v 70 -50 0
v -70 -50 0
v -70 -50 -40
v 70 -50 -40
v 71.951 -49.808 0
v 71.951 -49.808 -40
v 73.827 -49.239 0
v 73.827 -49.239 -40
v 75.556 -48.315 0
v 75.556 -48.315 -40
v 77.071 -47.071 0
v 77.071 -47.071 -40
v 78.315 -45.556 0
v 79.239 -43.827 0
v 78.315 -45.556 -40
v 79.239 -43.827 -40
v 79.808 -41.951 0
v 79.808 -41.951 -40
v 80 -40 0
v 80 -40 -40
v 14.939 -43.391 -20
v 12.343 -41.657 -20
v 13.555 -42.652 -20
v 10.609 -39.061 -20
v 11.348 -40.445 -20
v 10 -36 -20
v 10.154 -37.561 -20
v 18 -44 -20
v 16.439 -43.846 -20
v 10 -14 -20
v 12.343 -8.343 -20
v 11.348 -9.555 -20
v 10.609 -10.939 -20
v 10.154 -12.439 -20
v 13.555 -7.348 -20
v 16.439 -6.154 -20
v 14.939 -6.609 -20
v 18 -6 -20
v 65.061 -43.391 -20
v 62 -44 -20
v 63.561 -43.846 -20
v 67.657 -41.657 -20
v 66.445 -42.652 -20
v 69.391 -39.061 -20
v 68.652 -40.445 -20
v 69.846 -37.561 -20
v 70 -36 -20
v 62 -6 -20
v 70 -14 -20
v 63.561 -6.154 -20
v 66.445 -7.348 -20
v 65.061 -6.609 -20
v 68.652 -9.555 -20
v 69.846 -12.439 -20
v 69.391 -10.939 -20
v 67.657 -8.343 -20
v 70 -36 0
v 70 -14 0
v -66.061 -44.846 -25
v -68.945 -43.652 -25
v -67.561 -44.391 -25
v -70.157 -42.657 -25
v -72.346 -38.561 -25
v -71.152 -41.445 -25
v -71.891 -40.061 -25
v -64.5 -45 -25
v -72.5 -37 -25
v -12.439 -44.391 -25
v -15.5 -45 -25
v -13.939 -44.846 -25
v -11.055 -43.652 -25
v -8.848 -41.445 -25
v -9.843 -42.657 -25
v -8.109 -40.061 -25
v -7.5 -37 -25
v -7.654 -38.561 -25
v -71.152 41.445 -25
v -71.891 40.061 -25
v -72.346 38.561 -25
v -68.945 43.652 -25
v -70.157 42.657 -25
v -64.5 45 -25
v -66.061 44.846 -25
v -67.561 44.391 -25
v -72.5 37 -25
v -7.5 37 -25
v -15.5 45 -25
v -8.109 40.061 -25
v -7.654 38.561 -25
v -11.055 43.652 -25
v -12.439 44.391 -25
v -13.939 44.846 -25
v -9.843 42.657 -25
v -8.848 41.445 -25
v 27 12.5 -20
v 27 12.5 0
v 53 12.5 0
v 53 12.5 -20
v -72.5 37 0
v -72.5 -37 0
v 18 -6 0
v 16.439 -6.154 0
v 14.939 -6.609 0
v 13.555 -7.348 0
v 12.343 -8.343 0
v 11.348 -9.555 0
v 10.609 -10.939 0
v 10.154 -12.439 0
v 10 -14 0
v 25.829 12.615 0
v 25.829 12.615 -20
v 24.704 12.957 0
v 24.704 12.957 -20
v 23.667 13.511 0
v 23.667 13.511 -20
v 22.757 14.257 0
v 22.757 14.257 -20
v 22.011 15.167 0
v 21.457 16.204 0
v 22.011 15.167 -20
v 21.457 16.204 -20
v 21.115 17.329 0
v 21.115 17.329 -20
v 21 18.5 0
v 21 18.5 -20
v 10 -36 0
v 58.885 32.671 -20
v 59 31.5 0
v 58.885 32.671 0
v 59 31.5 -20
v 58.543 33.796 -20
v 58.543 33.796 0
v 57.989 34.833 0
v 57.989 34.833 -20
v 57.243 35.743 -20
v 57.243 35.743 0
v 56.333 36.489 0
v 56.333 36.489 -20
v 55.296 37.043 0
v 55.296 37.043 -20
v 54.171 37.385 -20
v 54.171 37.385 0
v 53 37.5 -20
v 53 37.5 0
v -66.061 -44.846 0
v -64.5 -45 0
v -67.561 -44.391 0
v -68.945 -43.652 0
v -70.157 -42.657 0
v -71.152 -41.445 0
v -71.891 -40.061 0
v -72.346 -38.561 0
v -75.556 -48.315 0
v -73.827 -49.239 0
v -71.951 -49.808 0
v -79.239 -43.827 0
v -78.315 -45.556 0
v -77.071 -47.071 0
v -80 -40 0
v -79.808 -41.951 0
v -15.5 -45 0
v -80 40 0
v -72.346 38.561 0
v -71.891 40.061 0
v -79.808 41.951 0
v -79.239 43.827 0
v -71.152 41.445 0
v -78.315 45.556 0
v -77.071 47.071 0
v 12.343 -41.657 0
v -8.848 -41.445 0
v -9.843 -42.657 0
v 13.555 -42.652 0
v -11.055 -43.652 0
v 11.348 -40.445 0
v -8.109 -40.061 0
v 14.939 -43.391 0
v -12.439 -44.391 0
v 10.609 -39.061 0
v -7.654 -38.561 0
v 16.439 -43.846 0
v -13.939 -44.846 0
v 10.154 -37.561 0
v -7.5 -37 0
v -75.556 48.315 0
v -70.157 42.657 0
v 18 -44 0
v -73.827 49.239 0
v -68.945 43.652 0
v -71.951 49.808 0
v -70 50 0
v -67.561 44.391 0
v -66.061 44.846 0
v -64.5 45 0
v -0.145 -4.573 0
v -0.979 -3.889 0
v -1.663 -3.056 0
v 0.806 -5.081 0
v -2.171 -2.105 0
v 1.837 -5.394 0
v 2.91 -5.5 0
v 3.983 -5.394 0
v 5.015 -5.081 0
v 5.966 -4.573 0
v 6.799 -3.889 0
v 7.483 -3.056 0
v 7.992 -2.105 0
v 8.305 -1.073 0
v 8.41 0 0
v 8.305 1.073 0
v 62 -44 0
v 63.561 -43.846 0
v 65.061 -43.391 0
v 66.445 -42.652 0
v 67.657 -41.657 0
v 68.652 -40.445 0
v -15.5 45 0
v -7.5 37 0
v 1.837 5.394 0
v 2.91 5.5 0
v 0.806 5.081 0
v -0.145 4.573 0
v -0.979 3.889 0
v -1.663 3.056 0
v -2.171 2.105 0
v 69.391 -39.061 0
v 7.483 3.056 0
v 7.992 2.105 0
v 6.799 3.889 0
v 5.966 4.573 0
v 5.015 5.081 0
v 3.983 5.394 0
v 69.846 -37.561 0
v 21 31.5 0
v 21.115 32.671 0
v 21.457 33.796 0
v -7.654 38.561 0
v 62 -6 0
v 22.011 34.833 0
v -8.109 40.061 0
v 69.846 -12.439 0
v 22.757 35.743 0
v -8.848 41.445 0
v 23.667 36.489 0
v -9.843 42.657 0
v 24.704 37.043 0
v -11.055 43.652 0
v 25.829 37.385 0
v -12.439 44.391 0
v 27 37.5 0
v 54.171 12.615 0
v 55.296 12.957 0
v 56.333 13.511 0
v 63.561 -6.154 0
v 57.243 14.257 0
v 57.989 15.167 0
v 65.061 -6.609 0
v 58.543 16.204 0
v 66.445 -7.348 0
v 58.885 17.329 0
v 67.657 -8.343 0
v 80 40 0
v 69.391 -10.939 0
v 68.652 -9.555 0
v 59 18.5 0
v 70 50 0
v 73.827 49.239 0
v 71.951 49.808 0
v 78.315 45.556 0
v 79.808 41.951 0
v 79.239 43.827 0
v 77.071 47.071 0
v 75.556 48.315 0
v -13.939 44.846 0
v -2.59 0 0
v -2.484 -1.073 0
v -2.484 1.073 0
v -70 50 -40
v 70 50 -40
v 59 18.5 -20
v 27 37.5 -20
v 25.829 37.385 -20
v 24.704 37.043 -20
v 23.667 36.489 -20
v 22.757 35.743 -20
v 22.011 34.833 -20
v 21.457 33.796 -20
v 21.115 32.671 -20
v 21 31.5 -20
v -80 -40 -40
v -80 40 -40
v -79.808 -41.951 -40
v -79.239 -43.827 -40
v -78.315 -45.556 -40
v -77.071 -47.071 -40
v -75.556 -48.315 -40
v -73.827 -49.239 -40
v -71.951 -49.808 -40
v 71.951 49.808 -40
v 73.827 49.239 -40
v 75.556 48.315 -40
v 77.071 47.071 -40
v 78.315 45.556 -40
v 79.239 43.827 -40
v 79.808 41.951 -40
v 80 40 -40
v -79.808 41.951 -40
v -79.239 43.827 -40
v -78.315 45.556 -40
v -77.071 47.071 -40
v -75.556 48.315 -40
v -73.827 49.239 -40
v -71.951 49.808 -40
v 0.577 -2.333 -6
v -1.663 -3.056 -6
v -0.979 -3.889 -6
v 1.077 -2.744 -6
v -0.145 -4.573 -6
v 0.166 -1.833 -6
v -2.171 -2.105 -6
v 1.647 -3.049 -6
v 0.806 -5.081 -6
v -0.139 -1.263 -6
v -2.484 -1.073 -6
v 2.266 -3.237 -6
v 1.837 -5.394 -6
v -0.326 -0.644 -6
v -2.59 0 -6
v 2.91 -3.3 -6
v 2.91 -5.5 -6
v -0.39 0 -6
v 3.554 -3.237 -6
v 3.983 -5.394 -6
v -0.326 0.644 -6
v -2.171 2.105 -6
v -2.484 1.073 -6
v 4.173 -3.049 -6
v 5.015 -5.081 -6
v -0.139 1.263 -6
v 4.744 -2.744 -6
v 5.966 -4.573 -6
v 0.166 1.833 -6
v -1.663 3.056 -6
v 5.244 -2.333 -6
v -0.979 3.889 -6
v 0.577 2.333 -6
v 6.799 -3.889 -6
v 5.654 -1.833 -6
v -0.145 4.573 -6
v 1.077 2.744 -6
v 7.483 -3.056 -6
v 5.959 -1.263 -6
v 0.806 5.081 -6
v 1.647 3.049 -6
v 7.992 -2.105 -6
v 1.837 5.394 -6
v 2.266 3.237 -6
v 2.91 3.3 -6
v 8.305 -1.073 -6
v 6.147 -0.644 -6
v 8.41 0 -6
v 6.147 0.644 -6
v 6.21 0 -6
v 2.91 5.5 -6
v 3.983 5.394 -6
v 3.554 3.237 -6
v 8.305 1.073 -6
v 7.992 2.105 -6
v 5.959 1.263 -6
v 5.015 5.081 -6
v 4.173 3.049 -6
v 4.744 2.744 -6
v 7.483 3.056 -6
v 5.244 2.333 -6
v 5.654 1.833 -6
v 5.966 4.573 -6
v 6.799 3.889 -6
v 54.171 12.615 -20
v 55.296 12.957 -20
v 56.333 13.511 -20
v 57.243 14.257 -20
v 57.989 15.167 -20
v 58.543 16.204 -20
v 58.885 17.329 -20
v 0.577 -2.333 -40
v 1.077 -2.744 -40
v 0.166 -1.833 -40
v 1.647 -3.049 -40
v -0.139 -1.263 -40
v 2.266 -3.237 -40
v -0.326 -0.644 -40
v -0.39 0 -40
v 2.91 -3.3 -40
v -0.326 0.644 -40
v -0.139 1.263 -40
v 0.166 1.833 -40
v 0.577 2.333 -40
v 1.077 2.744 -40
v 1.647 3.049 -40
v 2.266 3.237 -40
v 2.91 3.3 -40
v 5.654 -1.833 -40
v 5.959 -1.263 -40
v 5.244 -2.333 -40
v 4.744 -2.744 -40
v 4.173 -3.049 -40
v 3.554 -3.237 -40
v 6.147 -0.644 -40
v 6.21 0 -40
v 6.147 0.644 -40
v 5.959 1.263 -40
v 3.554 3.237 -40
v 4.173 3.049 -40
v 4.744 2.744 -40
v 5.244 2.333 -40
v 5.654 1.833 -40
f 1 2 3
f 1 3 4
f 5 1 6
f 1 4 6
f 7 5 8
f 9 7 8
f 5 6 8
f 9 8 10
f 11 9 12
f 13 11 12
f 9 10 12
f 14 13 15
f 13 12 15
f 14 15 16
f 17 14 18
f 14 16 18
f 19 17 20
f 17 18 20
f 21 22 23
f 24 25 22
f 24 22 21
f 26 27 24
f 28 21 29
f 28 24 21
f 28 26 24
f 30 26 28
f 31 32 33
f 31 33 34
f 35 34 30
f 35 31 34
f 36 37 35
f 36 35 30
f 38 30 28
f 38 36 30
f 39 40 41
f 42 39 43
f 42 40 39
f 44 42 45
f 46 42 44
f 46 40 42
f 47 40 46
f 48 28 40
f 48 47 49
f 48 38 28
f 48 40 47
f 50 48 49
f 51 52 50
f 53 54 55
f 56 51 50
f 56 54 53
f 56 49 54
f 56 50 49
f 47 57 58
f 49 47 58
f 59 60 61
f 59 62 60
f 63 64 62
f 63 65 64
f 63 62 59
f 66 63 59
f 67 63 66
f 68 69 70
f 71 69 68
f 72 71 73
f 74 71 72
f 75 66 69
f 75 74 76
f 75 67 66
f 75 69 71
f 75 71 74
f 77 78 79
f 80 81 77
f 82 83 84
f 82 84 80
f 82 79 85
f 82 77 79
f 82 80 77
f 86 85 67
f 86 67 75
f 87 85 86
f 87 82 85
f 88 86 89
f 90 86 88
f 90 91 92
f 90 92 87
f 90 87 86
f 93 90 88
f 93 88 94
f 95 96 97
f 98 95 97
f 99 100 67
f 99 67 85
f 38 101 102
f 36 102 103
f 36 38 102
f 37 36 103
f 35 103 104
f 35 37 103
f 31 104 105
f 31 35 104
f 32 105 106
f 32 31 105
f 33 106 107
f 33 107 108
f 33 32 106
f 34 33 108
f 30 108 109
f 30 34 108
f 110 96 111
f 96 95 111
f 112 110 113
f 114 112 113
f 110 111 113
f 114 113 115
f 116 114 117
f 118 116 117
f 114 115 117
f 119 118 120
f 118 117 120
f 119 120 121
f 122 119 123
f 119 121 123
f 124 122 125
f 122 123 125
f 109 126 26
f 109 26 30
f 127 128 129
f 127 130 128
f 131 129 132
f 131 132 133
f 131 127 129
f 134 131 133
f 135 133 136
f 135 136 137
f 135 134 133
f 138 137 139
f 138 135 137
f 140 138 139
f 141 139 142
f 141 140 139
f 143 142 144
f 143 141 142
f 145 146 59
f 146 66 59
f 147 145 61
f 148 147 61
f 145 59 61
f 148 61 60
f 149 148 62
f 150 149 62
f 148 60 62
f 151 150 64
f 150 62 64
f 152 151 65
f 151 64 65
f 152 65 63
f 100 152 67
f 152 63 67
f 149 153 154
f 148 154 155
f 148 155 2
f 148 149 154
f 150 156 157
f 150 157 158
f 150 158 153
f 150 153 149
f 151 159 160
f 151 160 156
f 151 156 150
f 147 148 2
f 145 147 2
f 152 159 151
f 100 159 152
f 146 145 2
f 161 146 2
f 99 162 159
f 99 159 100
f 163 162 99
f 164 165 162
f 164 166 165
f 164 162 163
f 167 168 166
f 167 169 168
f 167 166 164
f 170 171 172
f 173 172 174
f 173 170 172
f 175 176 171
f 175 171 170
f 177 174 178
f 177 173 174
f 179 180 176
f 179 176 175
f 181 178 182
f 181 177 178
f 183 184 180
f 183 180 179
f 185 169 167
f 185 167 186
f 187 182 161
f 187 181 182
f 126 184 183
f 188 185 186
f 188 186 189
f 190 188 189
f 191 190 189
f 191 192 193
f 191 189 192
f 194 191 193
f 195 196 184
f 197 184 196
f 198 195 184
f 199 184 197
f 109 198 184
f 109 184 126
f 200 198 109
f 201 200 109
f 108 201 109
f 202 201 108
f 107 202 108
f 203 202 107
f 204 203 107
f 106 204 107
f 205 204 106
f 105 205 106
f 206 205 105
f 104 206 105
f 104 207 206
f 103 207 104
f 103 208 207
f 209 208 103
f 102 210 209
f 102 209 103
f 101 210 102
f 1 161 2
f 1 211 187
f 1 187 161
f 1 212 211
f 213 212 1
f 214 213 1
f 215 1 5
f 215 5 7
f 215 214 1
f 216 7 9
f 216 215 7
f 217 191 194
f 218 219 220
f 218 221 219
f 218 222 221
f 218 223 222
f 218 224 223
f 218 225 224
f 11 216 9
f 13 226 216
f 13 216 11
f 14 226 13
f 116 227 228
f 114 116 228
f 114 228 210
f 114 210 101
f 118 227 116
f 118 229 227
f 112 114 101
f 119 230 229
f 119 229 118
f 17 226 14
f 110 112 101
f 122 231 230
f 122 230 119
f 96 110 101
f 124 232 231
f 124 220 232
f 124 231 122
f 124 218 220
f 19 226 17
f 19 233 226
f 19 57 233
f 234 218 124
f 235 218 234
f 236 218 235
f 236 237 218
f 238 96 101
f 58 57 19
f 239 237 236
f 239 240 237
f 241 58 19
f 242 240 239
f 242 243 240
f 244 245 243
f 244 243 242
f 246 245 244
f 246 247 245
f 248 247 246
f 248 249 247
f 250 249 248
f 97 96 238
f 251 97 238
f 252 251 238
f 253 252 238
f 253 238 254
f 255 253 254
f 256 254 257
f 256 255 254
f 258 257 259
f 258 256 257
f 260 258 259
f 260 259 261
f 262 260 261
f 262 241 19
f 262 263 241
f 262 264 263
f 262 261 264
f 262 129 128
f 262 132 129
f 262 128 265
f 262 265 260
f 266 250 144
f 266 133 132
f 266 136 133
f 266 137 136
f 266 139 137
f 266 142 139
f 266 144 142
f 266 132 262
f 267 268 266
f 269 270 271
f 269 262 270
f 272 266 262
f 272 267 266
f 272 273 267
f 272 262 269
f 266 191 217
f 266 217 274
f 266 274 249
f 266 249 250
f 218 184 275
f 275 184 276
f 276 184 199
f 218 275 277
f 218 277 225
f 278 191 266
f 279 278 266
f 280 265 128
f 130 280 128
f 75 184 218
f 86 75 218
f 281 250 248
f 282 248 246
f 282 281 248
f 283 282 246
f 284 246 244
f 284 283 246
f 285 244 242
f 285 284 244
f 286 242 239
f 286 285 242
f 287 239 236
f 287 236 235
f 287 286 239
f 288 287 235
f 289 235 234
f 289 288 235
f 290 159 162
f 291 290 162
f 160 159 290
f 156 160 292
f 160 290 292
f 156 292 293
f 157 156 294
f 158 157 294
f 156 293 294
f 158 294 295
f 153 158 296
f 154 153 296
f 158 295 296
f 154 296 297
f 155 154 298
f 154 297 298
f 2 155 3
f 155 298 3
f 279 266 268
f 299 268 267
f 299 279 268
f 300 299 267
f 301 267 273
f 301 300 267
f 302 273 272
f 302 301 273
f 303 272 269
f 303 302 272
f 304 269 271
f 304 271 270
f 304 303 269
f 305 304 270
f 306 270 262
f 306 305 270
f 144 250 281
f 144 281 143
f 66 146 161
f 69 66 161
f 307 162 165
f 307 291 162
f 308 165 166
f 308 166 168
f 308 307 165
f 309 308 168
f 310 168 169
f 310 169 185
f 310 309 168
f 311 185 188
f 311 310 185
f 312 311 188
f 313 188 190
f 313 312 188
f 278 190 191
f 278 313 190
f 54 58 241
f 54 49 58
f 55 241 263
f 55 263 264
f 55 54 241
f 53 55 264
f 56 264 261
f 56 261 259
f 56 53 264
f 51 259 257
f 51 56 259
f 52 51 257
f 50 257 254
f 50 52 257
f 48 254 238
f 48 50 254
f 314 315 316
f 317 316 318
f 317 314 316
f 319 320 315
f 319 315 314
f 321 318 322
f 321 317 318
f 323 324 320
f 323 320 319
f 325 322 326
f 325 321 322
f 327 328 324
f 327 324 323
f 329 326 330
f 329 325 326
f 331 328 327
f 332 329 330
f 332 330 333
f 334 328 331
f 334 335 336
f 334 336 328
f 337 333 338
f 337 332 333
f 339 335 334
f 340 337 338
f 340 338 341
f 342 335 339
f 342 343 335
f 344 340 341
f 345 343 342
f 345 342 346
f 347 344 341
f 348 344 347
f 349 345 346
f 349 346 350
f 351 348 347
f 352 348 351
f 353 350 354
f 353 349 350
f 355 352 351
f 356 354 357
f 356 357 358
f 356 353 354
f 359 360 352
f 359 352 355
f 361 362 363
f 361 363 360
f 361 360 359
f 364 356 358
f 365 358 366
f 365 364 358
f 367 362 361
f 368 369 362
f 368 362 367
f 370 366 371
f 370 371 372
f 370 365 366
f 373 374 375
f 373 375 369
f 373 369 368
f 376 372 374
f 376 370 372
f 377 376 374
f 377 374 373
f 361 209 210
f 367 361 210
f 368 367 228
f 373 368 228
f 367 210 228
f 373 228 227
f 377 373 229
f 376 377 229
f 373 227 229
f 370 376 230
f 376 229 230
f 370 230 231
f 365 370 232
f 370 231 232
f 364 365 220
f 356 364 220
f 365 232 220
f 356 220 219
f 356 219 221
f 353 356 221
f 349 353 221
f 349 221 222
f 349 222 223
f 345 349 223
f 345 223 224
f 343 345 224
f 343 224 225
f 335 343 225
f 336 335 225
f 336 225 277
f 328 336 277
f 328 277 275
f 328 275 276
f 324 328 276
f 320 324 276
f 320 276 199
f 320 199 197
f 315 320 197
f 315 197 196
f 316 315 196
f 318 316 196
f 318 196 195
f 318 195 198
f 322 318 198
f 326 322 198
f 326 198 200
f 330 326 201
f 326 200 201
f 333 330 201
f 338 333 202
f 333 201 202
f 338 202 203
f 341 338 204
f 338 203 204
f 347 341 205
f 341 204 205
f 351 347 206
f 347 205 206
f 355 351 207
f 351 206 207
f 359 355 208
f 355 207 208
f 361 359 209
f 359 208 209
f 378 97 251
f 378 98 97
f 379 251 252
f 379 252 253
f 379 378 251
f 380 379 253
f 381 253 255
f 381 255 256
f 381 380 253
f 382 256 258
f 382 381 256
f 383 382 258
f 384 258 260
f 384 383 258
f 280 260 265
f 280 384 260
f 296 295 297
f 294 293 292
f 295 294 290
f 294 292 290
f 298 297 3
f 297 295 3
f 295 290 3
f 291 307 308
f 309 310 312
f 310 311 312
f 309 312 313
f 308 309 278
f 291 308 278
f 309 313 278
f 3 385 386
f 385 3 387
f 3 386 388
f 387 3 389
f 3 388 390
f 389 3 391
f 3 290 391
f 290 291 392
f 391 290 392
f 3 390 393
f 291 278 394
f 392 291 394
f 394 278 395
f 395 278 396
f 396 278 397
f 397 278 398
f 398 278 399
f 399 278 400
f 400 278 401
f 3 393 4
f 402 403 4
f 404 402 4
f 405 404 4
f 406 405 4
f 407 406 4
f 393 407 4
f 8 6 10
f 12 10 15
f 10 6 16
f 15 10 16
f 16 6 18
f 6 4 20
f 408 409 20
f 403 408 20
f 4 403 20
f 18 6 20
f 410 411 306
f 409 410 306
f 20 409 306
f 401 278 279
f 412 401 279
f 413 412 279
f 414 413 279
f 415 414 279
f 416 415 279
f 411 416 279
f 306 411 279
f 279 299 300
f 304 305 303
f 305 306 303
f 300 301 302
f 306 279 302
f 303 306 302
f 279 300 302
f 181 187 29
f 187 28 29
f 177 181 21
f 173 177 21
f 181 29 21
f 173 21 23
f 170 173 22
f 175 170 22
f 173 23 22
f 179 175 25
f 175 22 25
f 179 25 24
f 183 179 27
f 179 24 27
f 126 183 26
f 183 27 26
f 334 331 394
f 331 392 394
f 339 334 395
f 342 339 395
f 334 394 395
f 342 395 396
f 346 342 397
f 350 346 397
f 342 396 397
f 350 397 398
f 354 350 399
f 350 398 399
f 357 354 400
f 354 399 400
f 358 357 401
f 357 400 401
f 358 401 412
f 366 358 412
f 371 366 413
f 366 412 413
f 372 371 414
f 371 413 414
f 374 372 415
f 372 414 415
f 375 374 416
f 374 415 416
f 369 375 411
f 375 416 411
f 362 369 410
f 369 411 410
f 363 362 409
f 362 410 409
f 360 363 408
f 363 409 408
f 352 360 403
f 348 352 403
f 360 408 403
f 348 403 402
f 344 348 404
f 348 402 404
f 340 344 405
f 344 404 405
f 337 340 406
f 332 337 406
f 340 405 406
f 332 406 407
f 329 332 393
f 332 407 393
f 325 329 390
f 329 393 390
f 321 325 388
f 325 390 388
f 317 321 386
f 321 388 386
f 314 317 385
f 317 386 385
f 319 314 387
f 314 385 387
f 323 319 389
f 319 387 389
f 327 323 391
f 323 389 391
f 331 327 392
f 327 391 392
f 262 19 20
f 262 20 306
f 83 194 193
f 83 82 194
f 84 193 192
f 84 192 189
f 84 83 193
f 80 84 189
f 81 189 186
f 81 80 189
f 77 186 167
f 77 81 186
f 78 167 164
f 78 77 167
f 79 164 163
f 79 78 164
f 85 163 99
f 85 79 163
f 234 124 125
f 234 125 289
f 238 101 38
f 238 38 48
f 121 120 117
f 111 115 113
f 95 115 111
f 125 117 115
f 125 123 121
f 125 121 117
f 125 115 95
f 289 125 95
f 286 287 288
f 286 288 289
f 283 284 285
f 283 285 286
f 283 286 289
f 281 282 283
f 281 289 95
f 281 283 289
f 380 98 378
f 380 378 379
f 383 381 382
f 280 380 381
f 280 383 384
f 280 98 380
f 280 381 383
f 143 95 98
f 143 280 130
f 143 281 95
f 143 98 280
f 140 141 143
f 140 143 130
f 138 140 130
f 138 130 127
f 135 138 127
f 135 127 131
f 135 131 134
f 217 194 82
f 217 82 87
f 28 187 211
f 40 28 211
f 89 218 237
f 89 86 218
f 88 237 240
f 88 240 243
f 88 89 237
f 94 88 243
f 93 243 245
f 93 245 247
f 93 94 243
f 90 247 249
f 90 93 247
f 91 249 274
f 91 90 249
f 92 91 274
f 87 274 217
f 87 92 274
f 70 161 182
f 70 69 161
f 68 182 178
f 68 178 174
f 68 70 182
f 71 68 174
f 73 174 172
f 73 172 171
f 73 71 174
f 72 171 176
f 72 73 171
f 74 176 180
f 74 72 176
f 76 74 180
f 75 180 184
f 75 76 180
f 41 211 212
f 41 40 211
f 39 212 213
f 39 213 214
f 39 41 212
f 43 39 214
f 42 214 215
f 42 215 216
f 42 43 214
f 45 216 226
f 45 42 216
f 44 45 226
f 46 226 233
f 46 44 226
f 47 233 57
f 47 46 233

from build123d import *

# Parameters (mm, degrees)
SKETCH1_W                      = 160
SKETCH1_H                      = 100
BOSS_EXTRUDE1_DEPTH            = 40
SKETCH2_W                      = 65
SKETCH2_H                      = 90
CUT_EXTRUDE1_DEPTH             = 25
FILLET1_R                      = 8
SKETCH3_W                      = 60
SKETCH3_H                      = 38
SKETCH3_W_2                    = 38
SKETCH3_H_2                    = 25
CUT_EXTRUDE2_DEPTH             = 20
FILLET2_R                      = 6
FILLET3_R                      = 8
FILLET4_R                      = 10
CBORE_FOR_M6_SHCS1_D           = 6.6
CBORE_FOR_M6_SHCS1_CBORE_D     = 11
CBORE_FOR_M6_SHCS1_CBORE_DEPTH = 6


with BuildPart() as part:
    # Sketch1 → Boss-Extrude1 (new body)
    with BuildSketch(Plane.XY):
        Rectangle(SKETCH1_W, SKETCH1_H)
    extrude(amount=-BOSS_EXTRUDE1_DEPTH)

    # Sketch2 → Cut-Extrude1 (cut)
    with BuildSketch(Plane.XY):
        with Locations((-40, 0)):
            Rectangle(SKETCH2_W, SKETCH2_H)
    extrude(amount=-CUT_EXTRUDE1_DEPTH, mode=Mode.SUBTRACT)

    # Fillet1
    fillet1_edges = [part.edges().sort_by_distance(p)[0] for p in [
        (-7.5, 45, -12.5),
        (-7.5, -45, -12.5),
        (-72.5, -45, -12.5),
        (-72.5, 45, -12.5),
    ]]
    fillet(fillet1_edges, radius=FILLET1_R)

    # Sketch3 → Cut-Extrude2 (cut)
    with BuildSketch(Plane.XY):
        with Locations((40, -25)):
            Rectangle(SKETCH3_W, SKETCH3_H)
        with Locations((40, 25)):
            Rectangle(SKETCH3_W_2, SKETCH3_H_2)
    extrude(amount=-CUT_EXTRUDE2_DEPTH, mode=Mode.SUBTRACT)

    # Fillet2
    fillet2_edges = [part.edges().sort_by_distance(p)[0] for p in [
        (59, 37.5, -10),
        (59, 12.5, -10),
        (21, 12.5, -10),
        (21, 37.5, -10),
    ]]
    fillet(fillet2_edges, radius=FILLET2_R)

    # Fillet3
    fillet3_edges = [part.edges().sort_by_distance(p)[0] for p in [
        (70, -6, -10),
        (70, -44, -10),
        (10, -44, -10),
        (10, -6, -10),
    ]]
    fillet(fillet3_edges, radius=FILLET3_R)

    # Fillet4
    fillet4_edges = [part.edges().sort_by_distance(p)[0] for p in [
        (80, -50, -20),
        (-80, -50, -20),
        (-80, 50, -20),
        (80, 50, -20),
    ]]
    fillet(fillet4_edges, radius=FILLET4_R)

    # CBORE for M6 SHCS1 (through all)
    with Locations(Plane.XY):
        with Locations((2.910260727, 0)):
            CounterBoreHole(CBORE_FOR_M6_SHCS1_D / 2, CBORE_FOR_M6_SHCS1_CBORE_D / 2, CBORE_FOR_M6_SHCS1_CBORE_DEPTH)


solid = part.part
